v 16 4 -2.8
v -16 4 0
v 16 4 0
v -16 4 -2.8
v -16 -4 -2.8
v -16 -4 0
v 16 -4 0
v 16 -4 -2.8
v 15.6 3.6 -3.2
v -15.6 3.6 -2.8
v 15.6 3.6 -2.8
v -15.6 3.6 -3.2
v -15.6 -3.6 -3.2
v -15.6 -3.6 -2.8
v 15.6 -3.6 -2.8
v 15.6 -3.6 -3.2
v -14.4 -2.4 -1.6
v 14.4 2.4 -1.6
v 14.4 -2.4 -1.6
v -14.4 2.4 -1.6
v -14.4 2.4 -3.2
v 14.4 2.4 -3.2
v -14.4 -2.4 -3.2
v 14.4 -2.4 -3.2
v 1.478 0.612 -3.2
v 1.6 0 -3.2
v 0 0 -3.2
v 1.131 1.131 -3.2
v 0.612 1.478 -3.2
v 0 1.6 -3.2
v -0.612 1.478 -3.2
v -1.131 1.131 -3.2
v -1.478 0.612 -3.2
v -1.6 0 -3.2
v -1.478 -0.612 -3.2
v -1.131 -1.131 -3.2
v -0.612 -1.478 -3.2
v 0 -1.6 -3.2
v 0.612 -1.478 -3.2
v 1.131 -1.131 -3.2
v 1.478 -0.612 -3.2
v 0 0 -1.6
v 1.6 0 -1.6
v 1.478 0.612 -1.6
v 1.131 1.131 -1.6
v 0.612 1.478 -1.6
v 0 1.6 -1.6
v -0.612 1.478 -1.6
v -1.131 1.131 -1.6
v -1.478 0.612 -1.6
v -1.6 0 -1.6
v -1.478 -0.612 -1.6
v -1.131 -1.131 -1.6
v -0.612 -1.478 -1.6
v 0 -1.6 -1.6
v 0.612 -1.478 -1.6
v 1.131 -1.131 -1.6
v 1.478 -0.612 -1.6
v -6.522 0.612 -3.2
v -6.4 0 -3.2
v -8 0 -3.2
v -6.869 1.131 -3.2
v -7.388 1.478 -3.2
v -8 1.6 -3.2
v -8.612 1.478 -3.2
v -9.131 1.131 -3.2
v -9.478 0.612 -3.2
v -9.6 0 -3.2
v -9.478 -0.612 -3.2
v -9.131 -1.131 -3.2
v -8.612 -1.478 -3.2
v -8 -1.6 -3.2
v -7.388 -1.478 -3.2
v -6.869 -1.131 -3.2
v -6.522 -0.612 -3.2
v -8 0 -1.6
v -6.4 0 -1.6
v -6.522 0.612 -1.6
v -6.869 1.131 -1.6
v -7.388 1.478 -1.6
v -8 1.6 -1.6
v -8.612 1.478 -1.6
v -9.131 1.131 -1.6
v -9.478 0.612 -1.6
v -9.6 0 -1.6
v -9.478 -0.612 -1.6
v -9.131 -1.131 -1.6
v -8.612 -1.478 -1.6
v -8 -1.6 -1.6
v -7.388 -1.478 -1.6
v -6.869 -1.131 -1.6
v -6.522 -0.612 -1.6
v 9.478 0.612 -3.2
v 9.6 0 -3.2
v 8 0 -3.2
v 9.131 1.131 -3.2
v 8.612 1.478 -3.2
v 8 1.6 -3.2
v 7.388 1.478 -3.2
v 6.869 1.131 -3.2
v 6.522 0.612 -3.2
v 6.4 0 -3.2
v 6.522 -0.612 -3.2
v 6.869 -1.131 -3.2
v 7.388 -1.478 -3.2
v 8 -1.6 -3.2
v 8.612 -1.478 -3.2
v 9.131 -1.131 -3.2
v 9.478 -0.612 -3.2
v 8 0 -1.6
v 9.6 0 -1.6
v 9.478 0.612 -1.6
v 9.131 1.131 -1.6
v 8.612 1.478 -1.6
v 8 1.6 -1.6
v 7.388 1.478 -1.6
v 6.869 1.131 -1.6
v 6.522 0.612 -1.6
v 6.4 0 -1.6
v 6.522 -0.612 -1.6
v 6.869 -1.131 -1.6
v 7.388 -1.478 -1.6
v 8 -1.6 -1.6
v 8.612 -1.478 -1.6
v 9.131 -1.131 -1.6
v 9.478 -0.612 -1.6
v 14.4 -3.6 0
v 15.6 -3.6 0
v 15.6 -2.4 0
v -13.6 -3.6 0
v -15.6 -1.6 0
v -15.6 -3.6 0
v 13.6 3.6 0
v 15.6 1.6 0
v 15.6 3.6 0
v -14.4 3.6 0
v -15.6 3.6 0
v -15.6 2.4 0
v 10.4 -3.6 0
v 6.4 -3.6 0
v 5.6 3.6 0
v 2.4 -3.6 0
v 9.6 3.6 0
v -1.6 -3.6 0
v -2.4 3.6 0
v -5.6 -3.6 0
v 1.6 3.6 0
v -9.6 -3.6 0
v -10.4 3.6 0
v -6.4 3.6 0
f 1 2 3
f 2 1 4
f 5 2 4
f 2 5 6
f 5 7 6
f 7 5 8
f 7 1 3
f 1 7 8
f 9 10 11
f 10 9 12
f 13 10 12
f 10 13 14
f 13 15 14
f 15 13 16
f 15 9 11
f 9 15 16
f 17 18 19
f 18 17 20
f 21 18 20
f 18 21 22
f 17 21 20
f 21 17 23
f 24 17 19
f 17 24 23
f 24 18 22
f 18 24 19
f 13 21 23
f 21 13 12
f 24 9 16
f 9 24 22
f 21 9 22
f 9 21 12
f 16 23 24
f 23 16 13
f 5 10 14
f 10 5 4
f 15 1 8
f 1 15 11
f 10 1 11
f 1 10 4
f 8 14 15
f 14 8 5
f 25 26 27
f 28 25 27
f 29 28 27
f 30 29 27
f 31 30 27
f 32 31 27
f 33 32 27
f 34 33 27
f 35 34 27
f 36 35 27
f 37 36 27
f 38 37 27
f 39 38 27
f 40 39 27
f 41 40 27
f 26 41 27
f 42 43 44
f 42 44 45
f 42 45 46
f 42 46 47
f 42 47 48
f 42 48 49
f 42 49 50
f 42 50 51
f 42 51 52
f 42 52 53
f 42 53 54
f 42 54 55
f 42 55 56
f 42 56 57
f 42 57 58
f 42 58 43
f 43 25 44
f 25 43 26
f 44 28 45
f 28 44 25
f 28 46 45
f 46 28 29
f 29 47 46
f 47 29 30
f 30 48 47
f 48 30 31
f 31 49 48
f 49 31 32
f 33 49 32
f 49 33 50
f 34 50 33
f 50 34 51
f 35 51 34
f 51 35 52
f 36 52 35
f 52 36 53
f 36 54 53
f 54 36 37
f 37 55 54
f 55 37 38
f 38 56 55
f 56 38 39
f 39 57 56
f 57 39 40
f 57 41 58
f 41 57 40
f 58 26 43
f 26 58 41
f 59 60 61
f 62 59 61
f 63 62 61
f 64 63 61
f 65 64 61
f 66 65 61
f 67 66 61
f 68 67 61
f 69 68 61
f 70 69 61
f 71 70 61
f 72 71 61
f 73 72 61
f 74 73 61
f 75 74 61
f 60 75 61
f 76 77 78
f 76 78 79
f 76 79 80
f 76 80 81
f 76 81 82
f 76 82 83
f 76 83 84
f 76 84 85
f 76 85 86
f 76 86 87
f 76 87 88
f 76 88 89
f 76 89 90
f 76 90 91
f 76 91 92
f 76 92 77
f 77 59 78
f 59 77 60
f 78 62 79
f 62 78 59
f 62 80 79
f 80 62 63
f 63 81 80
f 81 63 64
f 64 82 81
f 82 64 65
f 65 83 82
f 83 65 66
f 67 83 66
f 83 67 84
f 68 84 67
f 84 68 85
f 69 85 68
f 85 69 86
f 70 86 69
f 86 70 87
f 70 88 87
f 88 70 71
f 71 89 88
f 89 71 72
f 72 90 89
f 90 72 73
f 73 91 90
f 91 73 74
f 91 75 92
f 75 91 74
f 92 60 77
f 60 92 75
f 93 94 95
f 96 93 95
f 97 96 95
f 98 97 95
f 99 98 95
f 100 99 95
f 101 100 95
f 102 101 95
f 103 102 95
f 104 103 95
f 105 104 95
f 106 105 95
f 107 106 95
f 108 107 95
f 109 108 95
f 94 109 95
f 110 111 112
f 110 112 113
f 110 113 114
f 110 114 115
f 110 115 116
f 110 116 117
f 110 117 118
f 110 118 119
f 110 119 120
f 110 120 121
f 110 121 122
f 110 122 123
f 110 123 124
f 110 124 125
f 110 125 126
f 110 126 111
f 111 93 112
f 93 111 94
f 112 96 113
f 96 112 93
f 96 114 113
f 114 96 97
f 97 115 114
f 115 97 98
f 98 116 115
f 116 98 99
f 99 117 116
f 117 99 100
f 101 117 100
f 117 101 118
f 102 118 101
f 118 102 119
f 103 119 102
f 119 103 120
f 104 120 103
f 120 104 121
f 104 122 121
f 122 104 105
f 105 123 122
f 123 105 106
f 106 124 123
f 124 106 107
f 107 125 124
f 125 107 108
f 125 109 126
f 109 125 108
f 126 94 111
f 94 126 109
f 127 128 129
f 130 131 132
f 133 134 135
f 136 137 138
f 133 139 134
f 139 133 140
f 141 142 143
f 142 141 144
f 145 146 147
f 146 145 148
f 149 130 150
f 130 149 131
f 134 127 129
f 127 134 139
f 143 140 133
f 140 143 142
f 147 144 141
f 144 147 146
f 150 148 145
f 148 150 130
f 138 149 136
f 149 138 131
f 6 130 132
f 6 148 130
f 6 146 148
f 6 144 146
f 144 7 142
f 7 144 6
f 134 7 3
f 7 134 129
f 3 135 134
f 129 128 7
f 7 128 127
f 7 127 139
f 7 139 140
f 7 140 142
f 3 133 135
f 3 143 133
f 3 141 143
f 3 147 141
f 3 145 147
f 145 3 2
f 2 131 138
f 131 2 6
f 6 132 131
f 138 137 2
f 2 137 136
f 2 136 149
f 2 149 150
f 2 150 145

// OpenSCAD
// file: ../p/4-4edge.scad
use <../lib.scad>
function ldraw_lib__4_4edge() = [
// 0 Circle 1.0
// 0 Name: 4-4edge.dat
// 0 Author: James Jessiman
// 0 !LDRAW_ORG Primitive UPDATE 2017-01
// 0 !LICENSE Licensed under CC BY 2.0 and CC BY 4.0 : see CAreadme.txt
// 
// 0 BFC CERTIFY CCW
  [0,"BFC","CERTIFY"],
  [0,"BFC","CCW"],
// 
// 0 !HISTORY 1998-12-15 [PTadmin] Official Update 1998-10
// 0 !HISTORY 2005-12-28 [PTadmin] Official Update 2005-01
// 0 !HISTORY 2007-06-24 [PTadmin] Header formatted for Contributor Agreement
// 0 !HISTORY 2008-07-01 [PTadmin] Official Update 2008-01
// 0 !HISTORY 2017-01-15 [Steffen] BFCed
// 0 !HISTORY 2017-12-30 [PTadmin] Official Update 2017-01
// 
// 
// 2 24 1 0 0 0.9239 0 0.3827
  [2,24,1,0,0,0.9239,0,0.3827],
// 2 24 0.9239 0 0.3827 0.7071 0 0.7071
  [2,24,0.9239,0,0.3827,0.7071,0,0.7071],
// 2 24 0.7071 0 0.7071 0.3827 0 0.9239
  [2,24,0.7071,0,0.7071,0.3827,0,0.9239],
// 2 24 0.3827 0 0.9239 0 0 1
  [2,24,0.3827,0,0.9239,0,0,1],
// 2 24 0 0 1 -0.3827 0 0.9239
  [2,24,0,0,1,-0.3827,0,0.9239],
// 2 24 -0.3827 0 0.9239 -0.7071 0 0.7071
  [2,24,-0.3827,0,0.9239,-0.7071,0,0.7071],
// 2 24 -0.7071 0 0.7071 -0.9239 0 0.3827
  [2,24,-0.7071,0,0.7071,-0.9239,0,0.3827],
// 2 24 -0.9239 0 0.3827 -1 0 -0
  [2,24,-0.9239,0,0.3827,-1,0,-0],
// 2 24 -1 0 -0 -0.9239 0 -0.3827
  [2,24,-1,0,-0,-0.9239,0,-0.3827],
// 2 24 -0.9239 0 -0.3827 -0.7071 0 -0.7071
  [2,24,-0.9239,0,-0.3827,-0.7071,0,-0.7071],
// 2 24 -0.7071 0 -0.7071 -0.3827 0 -0.9239
  [2,24,-0.7071,0,-0.7071,-0.3827,0,-0.9239],
// 2 24 -0.3827 0 -0.9239 0 0 -1
  [2,24,-0.3827,0,-0.9239,0,0,-1],
// 2 24 0 0 -1 0.3827 0 -0.9239
  [2,24,0,0,-1,0.3827,0,-0.9239],
// 2 24 0.3827 0 -0.9239 0.7071 0 -0.7071
  [2,24,0.3827,0,-0.9239,0.7071,0,-0.7071],
// 2 24 0.7071 0 -0.7071 0.9239 0 -0.3827
  [2,24,0.7071,0,-0.7071,0.9239,0,-0.3827],
// 2 24 0.9239 0 -0.3827 1 0 0
  [2,24,0.9239,0,-0.3827,1,0,0],
];
module ldraw_lib__4_4edge(step=0, col=false, unit=2/5, alt=false, line=0.2, solid=!$preview)
    makepoly(ldraw_lib__4_4edge(), step=step, col=col, unit=unit, alt=alt, line=line, solid=solid);
ldraw_lib__4_4edge(line=0.2);
// file: ../p/4-4disc.scad
use <../lib.scad>
function ldraw_lib__4_4disc() = [
// 0 Disc 1.0
// 0 Name: 4-4disc.dat
// 0 Author: James Jessiman
// 0 !LDRAW_ORG Primitive UPDATE 2002-02
// 0 !LICENSE Licensed under CC BY 2.0 and CC BY 4.0 : see CAreadme.txt
// 
// 0 BFC CERTIFY CCW
  [0,"BFC","CERTIFY"],
  [0,"BFC","CCW"],
// 
// 0 !HISTORY 1998-12-15 [PTadmin] Official Update 1998-10
// 0 !HISTORY 2002-03-23 [sbliss] Added BFC statement
// 0 !HISTORY 2002-04-25 [PTadmin] Official Update 2002-02
// 0 !HISTORY 2007-06-24 [PTadmin] Header formatted for Contributor Agreement
// 0 !HISTORY 2008-07-01 [PTadmin] Official Update 2008-01
// 
// 
// 3 16 0 0 0 1 0 0 0.9239 0 0.3827
  [3,16,0,0,0,1,0,0,0.9239,0,0.3827],
// 3 16 0 0 0 0.9239 0 0.3827 0.7071 0 0.7071
  [3,16,0,0,0,0.9239,0,0.3827,0.7071,0,0.7071],
// 3 16 0 0 0 0.7071 0 0.7071 0.3827 0 0.9239
  [3,16,0,0,0,0.7071,0,0.7071,0.3827,0,0.9239],
// 3 16 0 0 0 0.3827 0 0.9239 0 0 1
  [3,16,0,0,0,0.3827,0,0.9239,0,0,1],
// 3 16 0 0 0 0 0 1 -0.3827 0 0.9239
  [3,16,0,0,0,0,0,1,-0.3827,0,0.9239],
// 3 16 0 0 0 -0.3827 0 0.9239 -0.7071 0 0.7071
  [3,16,0,0,0,-0.3827,0,0.9239,-0.7071,0,0.7071],
// 3 16 0 0 0 -0.7071 0 0.7071 -0.9239 0 0.3827
  [3,16,0,0,0,-0.7071,0,0.7071,-0.9239,0,0.3827],
// 3 16 0 0 0 -0.9239 0 0.3827 -1 0 -0
  [3,16,0,0,0,-0.9239,0,0.3827,-1,0,-0],
// 3 16 0 0 0 -1 0 -0 -0.9239 0 -0.3827
  [3,16,0,0,0,-1,0,-0,-0.9239,0,-0.3827],
// 3 16 0 0 0 -0.9239 0 -0.3827 -0.7071 0 -0.7071
  [3,16,0,0,0,-0.9239,0,-0.3827,-0.7071,0,-0.7071],
// 3 16 0 0 0 -0.7071 0 -0.7071 -0.3827 0 -0.9239
  [3,16,0,0,0,-0.7071,0,-0.7071,-0.3827,0,-0.9239],
// 3 16 0 0 0 -0.3827 0 -0.9239 0 0 -1
  [3,16,0,0,0,-0.3827,0,-0.9239,0,0,-1],
// 3 16 0 0 0 0 0 -1 0.3827 0 -0.9239
  [3,16,0,0,0,0,0,-1,0.3827,0,-0.9239],
// 3 16 0 0 0 0.3827 0 -0.9239 0.7071 0 -0.7071
  [3,16,0,0,0,0.3827,0,-0.9239,0.7071,0,-0.7071],
// 3 16 0 0 0 0.7071 0 -0.7071 0.9239 0 -0.3827
  [3,16,0,0,0,0.7071,0,-0.7071,0.9239,0,-0.3827],
// 3 16 0 0 0 0.9239 0 -0.3827 1 0 0
  [3,16,0,0,0,0.9239,0,-0.3827,1,0,0],
// 0
];
module ldraw_lib__4_4disc(step=0, col=false, unit=2/5, alt=false, line=0.2, solid=!$preview)
    makepoly(ldraw_lib__4_4disc(), step=step, col=col, unit=unit, alt=alt, line=line, solid=solid);
ldraw_lib__4_4disc(line=0.2);
// file: ../p/4-4cyli.scad
use <../lib.scad>
$fa=1; $fs=0.2;
function ldraw_lib__4_4cyli(realsolid=false) = [
// 0 Cylinder 1.0
// 0 Name: 4-4cyli.dat
// 0 Author: James Jessiman
// 0 !LDRAW_ORG Primitive UPDATE 2005-01
// 0 !LICENSE Licensed under CC BY 2.0 and CC BY 4.0 : see CAreadme.txt
// 
// 0 BFC CERTIFY CCW
  [0,"BFC","CERTIFY"],
  [0,"BFC","CCW"],
// 
// 0 !HISTORY 1998-12-15 [PTadmin] Official Update 1998-10
// 0 !HISTORY 2002-03-23 [sbliss] Added BFC statement; merged headers from files in distributions LDraw 0.27 and Complete.
// 0 !HISTORY 2002-04-25 [PTadmin] Official Update 2002-02
// 0 !HISTORY 2004-12-14 [guyvivan] BFC CCW
// 0 !HISTORY 2005-12-28 [PTadmin] Official Update 2005-01
// 0 !HISTORY 2007-06-24 [PTadmin] Header formatted for Contributor Agreement
// 0 !HISTORY 2008-07-01 [PTadmin] Official Update 2008-01
// 
// 
// 4 16 1 1 0 0.9239 1 0.3827 0.9239 0 0.3827 1 0 0
  [4,16,1,1,0,0.9239,1,0.3827,0.9239,0,0.3827,1,0,0],
// 5 24 1 0 0 1 1 0 0.9239 0 0.3827 0.9239 0 -0.3827
  [5,24,1,0,0,1,1,0,0.9239,0,0.3827,0.9239,0,-0.3827],
// 4 16 0.9239 1 0.3827 0.7071 1 0.7071 0.7071 0 0.7071 0.9239 0 0.3827
  [4,16,0.9239,1,0.3827,0.7071,1,0.7071,0.7071,0,0.7071,0.9239,0,0.3827],
// 5 24 0.9239 0 0.3827 0.9239 1 0.3827 0.7071 0 0.7071 1 0 0
  [5,24,0.9239,0,0.3827,0.9239,1,0.3827,0.7071,0,0.7071,1,0,0],
// 4 16 0.7071 1 0.7071 0.3827 1 0.9239 0.3827 0 0.9239 0.7071 0 0.7071
  [4,16,0.7071,1,0.7071,0.3827,1,0.9239,0.3827,0,0.9239,0.7071,0,0.7071],
// 5 24 0.7071 0 0.7071 0.7071 1 0.7071 0.3827 0 0.9239 0.9239 0 0.3827
  [5,24,0.7071,0,0.7071,0.7071,1,0.7071,0.3827,0,0.9239,0.9239,0,0.3827],
// 4 16 0.3827 1 0.9239 0 1 1 0 0 1 0.3827 0 0.9239
  [4,16,0.3827,1,0.9239,0,1,1,0,0,1,0.3827,0,0.9239],
// 5 24 0.3827 0 0.9239 0.3827 1 0.9239 0 0 1 0.7071 0 0.7071
  [5,24,0.3827,0,0.9239,0.3827,1,0.9239,0,0,1,0.7071,0,0.7071],
// 4 16 0 1 1 -0.3827 1 0.9239 -0.3827 0 0.9239 0 0 1
  [4,16,0,1,1,-0.3827,1,0.9239,-0.3827,0,0.9239,0,0,1],
// 5 24 0 0 1 0 1 1 -0.3827 0 0.9239 0.3827 0 0.9239
  [5,24,0,0,1,0,1,1,-0.3827,0,0.9239,0.3827,0,0.9239],
// 4 16 -0.3827 1 0.9239 -0.7071 1 0.7071 -0.7071 0 0.7071 -0.3827 0 0.9239
  [4,16,-0.3827,1,0.9239,-0.7071,1,0.7071,-0.7071,0,0.7071,-0.3827,0,0.9239],
// 5 24 -0.3827 0 0.9239 -0.3827 1 0.9239 -0.7071 0 0.7071 0 0 1
  [5,24,-0.3827,0,0.9239,-0.3827,1,0.9239,-0.7071,0,0.7071,0,0,1],
// 4 16 -0.7071 1 0.7071 -0.9239 1 0.3827 -0.9239 0 0.3827 -0.7071 0 0.7071
  [4,16,-0.7071,1,0.7071,-0.9239,1,0.3827,-0.9239,0,0.3827,-0.7071,0,0.7071],
// 5 24 -0.7071 0 0.7071 -0.7071 1 0.7071 -0.9239 0 0.3827 -0.3827 0 0.9239
  [5,24,-0.7071,0,0.7071,-0.7071,1,0.7071,-0.9239,0,0.3827,-0.3827,0,0.9239],
// 4 16 -0.9239 1 0.3827 -1 1 0 -1 0 0 -0.9239 0 0.3827
  [4,16,-0.9239,1,0.3827,-1,1,0,-1,0,0,-0.9239,0,0.3827],
// 5 24 -0.9239 0 0.3827 -0.9239 1 0.3827 -1 0 0 -0.7071 0 0.7071
  [5,24,-0.9239,0,0.3827,-0.9239,1,0.3827,-1,0,0,-0.7071,0,0.7071],
// 4 16 -1 1 0 -0.9239 1 -0.3827 -0.9239 0 -0.3827 -1 0 0
  [4,16,-1,1,0,-0.9239,1,-0.3827,-0.9239,0,-0.3827,-1,0,0],
// 5 24 -1 0 0 -1 1 0 -0.9239 0 -0.3827 -0.9239 0 0.3827
  [5,24,-1,0,0,-1,1,0,-0.9239,0,-0.3827,-0.9239,0,0.3827],
// 4 16 -0.9239 1 -0.3827 -0.7071 1 -0.7071 -0.7071 0 -0.7071 -0.9239 0 -0.3827
  [4,16,-0.9239,1,-0.3827,-0.7071,1,-0.7071,-0.7071,0,-0.7071,-0.9239,0,-0.3827],
// 5 24 -0.9239 0 -0.3827 -0.9239 1 -0.3827 -0.7071 0 -0.7071 -1 0 0
  [5,24,-0.9239,0,-0.3827,-0.9239,1,-0.3827,-0.7071,0,-0.7071,-1,0,0],
// 4 16 -0.7071 1 -0.7071 -0.3827 1 -0.9239 -0.3827 0 -0.9239 -0.7071 0 -0.7071
  [4,16,-0.7071,1,-0.7071,-0.3827,1,-0.9239,-0.3827,0,-0.9239,-0.7071,0,-0.7071],
// 5 24 -0.7071 0 -0.7071 -0.7071 1 -0.7071 -0.3827 0 -0.9239 -0.9239 0 -0.3827
  [5,24,-0.7071,0,-0.7071,-0.7071,1,-0.7071,-0.3827,0,-0.9239,-0.9239,0,-0.3827],
// 4 16 -0.3827 1 -0.9239 0 1 -1 0 0 -1 -0.3827 0 -0.9239
  [4,16,-0.3827,1,-0.9239,0,1,-1,0,0,-1,-0.3827,0,-0.9239],
// 5 24 -0.3827 0 -0.9239 -0.3827 1 -0.9239 0 0 -1 -0.7071 0 -0.7071
  [5,24,-0.3827,0,-0.9239,-0.3827,1,-0.9239,0,0,-1,-0.7071,0,-0.7071],
// 4 16 0 1 -1 0.3827 1 -0.9239 0.3827 0 -0.9239 0 0 -1
  [4,16,0,1,-1,0.3827,1,-0.9239,0.3827,0,-0.9239,0,0,-1],
// 5 24 0 0 -1 0 1 -1 0.3827 0 -0.9239 -0.3827 0 -0.9239
  [5,24,0,0,-1,0,1,-1,0.3827,0,-0.9239,-0.3827,0,-0.9239],
// 4 16 0.3827 1 -0.9239 0.7071 1 -0.7071 0.7071 0 -0.7071 0.3827 0 -0.9239
  [4,16,0.3827,1,-0.9239,0.7071,1,-0.7071,0.7071,0,-0.7071,0.3827,0,-0.9239],
// 5 24 0.3827 0 -0.9239 0.3827 1 -0.9239 0.7071 0 -0.7071 0 0 -1
  [5,24,0.3827,0,-0.9239,0.3827,1,-0.9239,0.7071,0,-0.7071,0,0,-1],
// 4 16 0.7071 1 -0.7071 0.9239 1 -0.3827 0.9239 0 -0.3827 0.7071 0 -0.7071
  [4,16,0.7071,1,-0.7071,0.9239,1,-0.3827,0.9239,0,-0.3827,0.7071,0,-0.7071],
// 5 24 0.7071 0 -0.7071 0.7071 1 -0.7071 0.9239 0 -0.3827 0.3827 0 -0.9239
  [5,24,0.7071,0,-0.7071,0.7071,1,-0.7071,0.9239,0,-0.3827,0.3827,0,-0.9239],
// 4 16 0.9239 1 -0.3827 1 1 0 1 0 0 0.9239 0 -0.3827
  [4,16,0.9239,1,-0.3827,1,1,0,1,0,0,0.9239,0,-0.3827],
// 5 24 0.9239 0 -0.3827 0.9239 1 -0.3827 1 0 0 0.7071 0 -0.7071
  [5,24,0.9239,0,-0.3827,0.9239,1,-0.3827,1,0,0,0.7071,0,-0.7071],
// 0
];
module ldraw_lib__4_4cyli(step=0, col=false, unit=2/5, alt=false, line=0.2, solid=!$preview)
    makepoly(ldraw_lib__4_4cyli(solid), step=step, col=col, unit=unit, alt=alt, line=line, solid=solid);
ldraw_lib__4_4cyli(line=0.2);
// file: ../p/stud3.scad
use <../lib.scad>
use <4-4cyli.scad>
use <4-4disc.scad>
use <4-4edge.scad>
function ldraw_lib__stud3() = [
// 0 Stud Tube Solid
// 0 Name: stud3.dat
// 0 Author: James Jessiman
// 0 !LDRAW_ORG Primitive UPDATE 2012-01
// 0 !LICENSE Licensed under CC BY 4.0 : see CAreadme.txt
// 
// 0 BFC CERTIFY CCW
  [0,"BFC","CERTIFY"],
  [0,"BFC","CCW"],
// 
// 0 !HISTORY 2002-04-04 [sbliss] Modified for BFC compliance
// 0 !HISTORY 2002-04-25 [PTadmin] Official Update 2002-02
// 0 !HISTORY 2007-06-24 [PTadmin] Header formatted for Contributor Agreement
// 0 !HISTORY 2008-07-01 [PTadmin] Official Update 2008-01
// 0 !HISTORY 2012-02-16 [Philo] Changed to CCW
// 0 !HISTORY 2012-03-30 [PTadmin] Official Update 2012-01
// 
// 
// 1 16 0 -4 0 4 0 0 0 1 0 0 0 4 4-4edge.dat
  [1,16,0,-4,0,4,0,0,0,1,0,0,0,4, ldraw_lib__4_4edge()],
// 1 16 0 0 0 4 0 0 0 1 0 0 0 4 4-4edge.dat
  [1,16,0,0,0,4,0,0,0,1,0,0,0,4, ldraw_lib__4_4edge()],
// 1 16 0 -4 0 4 0 0 0 1 0 0 0 4 4-4disc.dat
  [1,16,0,-4,0,4,0,0,0,1,0,0,0,4, ldraw_lib__4_4disc()],
  [-1,16,0,0,0,4,0,0,0,-1,0,0,0,4, ldraw_lib__4_4disc()],
// 1 16 0 -4 0 4 0 0 0 4 0 0 0 4 4-4cyli.dat
  [1,16,0,-4,0,4,0,0,0,4,0,0,0,4, ldraw_lib__4_4cyli()],
];
module ldraw_lib__stud3(step=0, col=false, unit=2/5, alt=false, line=0.2, solid=!$preview)
    makepoly(ldraw_lib__stud3(), step=step, col=col, unit=unit, alt=alt, line=line, solid=solid);
ldraw_lib__stud3(line=0.2);
// file: ../p/box5.scad
use <../lib.scad>
function ldraw_lib__box5() = [
// 0 Box with 5 Faces and All Edges
// 0 Name: box5.dat
// 0 Author: James Jessiman
// 0 !LDRAW_ORG Primitive UPDATE 2012-01
// 0 !LICENSE Licensed under CC BY 2.0 and CC BY 4.0 : see CAreadme.txt
// 
// 0 BFC CERTIFY CCW
  [0,"BFC","CERTIFY"],
  [0,"BFC","CCW"],
// 
// 0 !HISTORY 2002-04-03 [sbliss] Modified for BFC compliance
// 0 !HISTORY 2002-04-25 [PTadmin] Official Update 2002-02
// 0 !HISTORY 2007-06-24 [PTadmin] Header formatted for Contributor Agreement
// 0 !HISTORY 2008-07-01 [PTadmin] Official Update 2008-01
// 0 !HISTORY 2012-02-16 [Philo] Changed to CCW
// 0 !HISTORY 2012-03-30 [PTadmin] Official Update 2012-01
// 
// 
// 2 24 1 1 1 -1 1 1
  [2,24,1,1,1,-1,1,1],
// 2 24 -1 1 1 -1 1 -1
  [2,24,-1,1,1,-1,1,-1],
// 2 24 -1 1 -1 1 1 -1
  [2,24,-1,1,-1,1,1,-1],
// 2 24 1 1 -1 1 1 1
  [2,24,1,1,-1,1,1,1],
// 2 24 1 0 1 -1 0 1
  [2,24,1,0,1,-1,0,1],
// 2 24 -1 0 1 -1 0 -1
  [2,24,-1,0,1,-1,0,-1],
// 2 24 -1 0 -1 1 0 -1
  [2,24,-1,0,-1,1,0,-1],
// 2 24 1 0 -1 1 0 1
  [2,24,1,0,-1,1,0,1],
// 2 24 1 0 1 1 1 1
  [2,24,1,0,1,1,1,1],
// 2 24 -1 0 1 -1 1 1
  [2,24,-1,0,1,-1,1,1],
// 2 24 1 0 -1 1 1 -1
  [2,24,1,0,-1,1,1,-1],
// 2 24 -1 0 -1 -1 1 -1
  [2,24,-1,0,-1,-1,1,-1],
// 4 16 -1 1 1 1 1 1 1 1 -1 -1 1 -1
  [4,16,-1,1,1,1,1,1,1,1,-1,-1,1,-1],
// 4 16 -1 1 1 -1 0 1 1 0 1 1 1 1
  [4,16,-1,1,1,-1,0,1,1,0,1,1,1,1],
// 4 16 -1 1 -1 -1 0 -1 -1 0 1 -1 1 1
  [4,16,-1,1,-1,-1,0,-1,-1,0,1,-1,1,1],
// 4 16 1 1 -1 1 0 -1 -1 0 -1 -1 1 -1
  [4,16,1,1,-1,1,0,-1,-1,0,-1,-1,1,-1],
// 4 16 1 1 1 1 0 1 1 0 -1 1 1 -1
  [4,16,1,1,1,1,0,1,1,0,-1,1,1,-1],
];
makepoly(ldraw_lib__box5(), line=0.2);
// file: ../p/box4.scad
use <../lib.scad>
function ldraw_lib__box4() = [
// 0 Box with 4 Faces (2 Parallel Pairs) and All Edges
// 0 Name: box4.dat
// 0 Author: James Jessiman
// 0 !LDRAW_ORG Primitive UPDATE 2012-01
// 0 !LICENSE Licensed under CC BY 4.0 : see CAreadme.txt
// 
// 0 BFC CERTIFY CCW
  [0,"BFC","CERTIFY"],
  [0,"BFC","CCW"],
// 
// 0 !HISTORY 2002-04-03 [sbliss] Modified for BFC compliance
// 0 !HISTORY 2002-04-25 [PTadmin] Official Update 2002-02
// 0 !HISTORY 2007-06-24 [PTadmin] Header formatted for Contributor Agreement
// 0 !HISTORY 2008-07-01 [PTadmin] Official Update 2008-01
// 0 !HISTORY 2012-02-16 [Philo] Changed to CCW
// 0 !HISTORY 2012-03-30 [PTadmin] Official Update 2012-01
// 
// 
// 2 24 1 1 1 -1 1 1
  [2,24,1,1,1,-1,1,1],
// 2 24 -1 1 1 -1 1 -1
  [2,24,-1,1,1,-1,1,-1],
// 2 24 -1 1 -1 1 1 -1
  [2,24,-1,1,-1,1,1,-1],
// 2 24 1 1 -1 1 1 1
  [2,24,1,1,-1,1,1,1],
// 2 24 1 0 1 -1 0 1
  [2,24,1,0,1,-1,0,1],
// 2 24 -1 0 1 -1 0 -1
  [2,24,-1,0,1,-1,0,-1],
// 2 24 -1 0 -1 1 0 -1
  [2,24,-1,0,-1,1,0,-1],
// 2 24 1 0 -1 1 0 1
  [2,24,1,0,-1,1,0,1],
// 2 24 1 0 1 1 1 1
  [2,24,1,0,1,1,1,1],
// 2 24 -1 0 1 -1 1 1
  [2,24,-1,0,1,-1,1,1],
// 2 24 1 0 -1 1 1 -1
  [2,24,1,0,-1,1,1,-1],
// 2 24 -1 0 -1 -1 1 -1
  [2,24,-1,0,-1,-1,1,-1],
// 4 16 -1 1 1 -1 0 1 1 0 1 1 1 1
  [4,16,-1,1,1,-1,0,1,1,0,1,1,1,1],
// 4 16 -1 1 -1 -1 0 -1 -1 0 1 -1 1 1
  [4,16,-1,1,-1,-1,0,-1,-1,0,1,-1,1,1],
// 4 16 1 1 -1 1 0 -1 -1 0 -1 -1 1 -1
  [4,16,1,1,-1,1,0,-1,-1,0,-1,-1,1,-1],
// 4 16 1 1 1 1 0 1 1 0 -1 1 1 -1
  [4,16,1,1,1,1,0,1,1,0,-1,1,1,-1],
];
module ldraw_lib__box4(step=0, col=false, unit=2/5, alt=false, line=0.2, solid=!$preview)
    makepoly(ldraw_lib__box4(), step=step, col=col, unit=unit, alt=alt, line=line, solid=solid);
ldraw_lib__box4(line=0.2);
// file: s/2431s01.scad
use <../../lib.scad>
use <../../p/box4.scad>
use <../../p/box5.scad>
use <../../p/stud3.scad>
function ldraw_lib__s__2431s01() = [
// 0 ~Tile  1 x  4 with Groove without Top Face
// 0 Name: s\2431s01.dat
// 0 Author: Santeri Piippo [arezey]
// 0 !LDRAW_ORG Subpart UPDATE 2010-02
// 0 !LICENSE Licensed under CC BY 2.0 and CC BY 4.0 : see CAreadme.txt
// 
// 0 BFC CERTIFY CCW
  [0,"BFC","CERTIFY"],
  [0,"BFC","CCW"],
// 
// 0 !HISTORY 2010-07-05 [PTadmin] Official Update 2010-02
// 
// 
// 1 16 0 0 0 40 0 0 0 7 0 0 0 10 box4.dat
  [1,16,0,0,0,40,0,0,0,7,0,0,0,10, ldraw_lib__box4()],
// 1 16 0 7 0 39 0 0 0 1 0 0 0 9 box4.dat
  [1,16,0,7,0,39,0,0,0,1,0,0,0,9, ldraw_lib__box4()],
// 0 BFC INVERTNEXT
  [0,"BFC","INVERTNEXT"],
// 1 16 0 8 0 36 0 0 0 -4 0 0 0 6 box5.dat
  [1,16,0,8,0,36,0,0,0,-4,0,0,0,6, ldraw_lib__box5()],
// 4 16 -39 8 9 -36 8 6 -36 8 -6 -39 8 -9
  [4,16,-39,8,9,-36,8,6,-36,8,-6,-39,8,-9],
// 4 16 39 8 -9 36 8 -6 36 8 6 39 8 9
  [4,16,39,8,-9,36,8,-6,36,8,6,39,8,9],
// 4 16 39 8 9 36 8 6 -36 8 6 -39 8 9
  [4,16,39,8,9,36,8,6,-36,8,6,-39,8,9],
// 4 16 -39 8 -9 -36 8 -6 36 8 -6 39 8 -9
  [4,16,-39,8,-9,-36,8,-6,36,8,-6,39,8,-9],
// 4 16 -40 7 10 -39 7 9 -39 7 -9 -40 7 -10
  [4,16,-40,7,10,-39,7,9,-39,7,-9,-40,7,-10],
// 4 16 40 7 -10 39 7 -9 39 7 9 40 7 10
  [4,16,40,7,-10,39,7,-9,39,7,9,40,7,10],
// 4 16 40 7 10 39 7 9 -39 7 9 -40 7 10
  [4,16,40,7,10,39,7,9,-39,7,9,-40,7,10],
// 4 16 -40 7 -10 -39 7 -9 39 7 -9 40 7 -10
  [4,16,-40,7,-10,-39,7,-9,39,7,-9,40,7,-10],
// 1 16 0 4 0 1 0 0 0 -1 0 0 0 1 stud3.dat
  [1,16,0,4,0,1,0,0,0,-1,0,0,0,1, ldraw_lib__stud3()],
// 1 16 -20 4 0 1 0 0 0 -1 0 0 0 1 stud3.dat
  [1,16,-20,4,0,1,0,0,0,-1,0,0,0,1, ldraw_lib__stud3()],
// 1 16 20 4 0 1 0 0 0 -1 0 0 0 1 stud3.dat
  [1,16,20,4,0,1,0,0,0,-1,0,0,0,1, ldraw_lib__stud3()],
// 0 //
];
makepoly(ldraw_lib__s__2431s01(), line=0.2);
// file: s/2431p02s03.scad
use <../../lib.scad>
function ldraw_lib__s__2431p02s03() = [
// 0 ~Tile  1 x  4 with Red Danger Stripes Pattern - Half Border
// 0 Name: s\2431p02s03.dat
// 0 Author: Marc Giraudet [Mad_Marc]
// 0 !LDRAW_ORG Subpart UPDATE 2024-06
// 0 !LICENSE Licensed under CC BY 4.0 : see CAreadme.txt
// 
// 0 BFC CERTIFY CCW
  [0,"BFC","CERTIFY"],
  [0,"BFC","CCW"],
// 
// 0 !HISTORY 2024-07-29 [OrionP] Official Update 2024-06
// 
// 3 16 -40 0 -10 -34 0 -9 -39 0 -9
  [3,16,-40,0,-10,-34,0,-9,-39,0,-9],
// 3 16 -40 0 -10 -24 0 -9 -34 0 -9
  [3,16,-40,0,-10,-24,0,-9,-34,0,-9],
// 3 16 -40 0 -10 -14 0 -9 -24 0 -9
  [3,16,-40,0,-10,-14,0,-9,-24,0,-9],
// 3 16 -40 0 -10 -4 0 -9 -14 0 -9
  [3,16,-40,0,-10,-4,0,-9,-14,0,-9],
// 4 16 -40 0 -10 40 0 -10 6 0 -9 -4 0 -9
  [4,16,-40,0,-10,40,0,-10,6,0,-9,-4,0,-9],
// 4 16 40 0 10 39 0 4 39 0 -6 40 0 -10
  [4,16,40,0,10,39,0,4,39,0,-6,40,0,-10],
// 3 16 40 0 10 39 0 9 39 0 4
  [3,16,40,0,10,39,0,9,39,0,4],
// 3 16 39 0 -6 39 0 -9 40 0 -10
  [3,16,39,0,-6,39,0,-9,40,0,-10],
// 3 16 40 0 -10 39 0 -9 36 0 -9
  [3,16,40,0,-10,39,0,-9,36,0,-9],
// 3 16 40 0 -10 36 0 -9 26 0 -9
  [3,16,40,0,-10,36,0,-9,26,0,-9],
// 3 16 40 0 -10 26 0 -9 16 0 -9
  [3,16,40,0,-10,26,0,-9,16,0,-9],
// 3 16 40 0 -10 16 0 -9 6 0 -9
  [3,16,40,0,-10,16,0,-9,6,0,-9],
];
module ldraw_lib__s__2431p02s03(step=0, col=false, unit=2/5, alt=false, line=0.2, solid=!$preview)
    makepoly(ldraw_lib__s__2431p02s03(), step=step, col=col, unit=unit, alt=alt, line=line, solid=solid);
ldraw_lib__s__2431p02s03(line=0.2);
// file: s/2431p02s02.scad
use <../../lib.scad>
function ldraw_lib__s__2431p02s02() = [
// 0 ~Tile  1 x  4 with Danger Stripes Red Pattern - Zag
// 0 Name: s\2431p02s02.dat
// 0 Author: Marc Giraudet [Mad_Marc]
// 0 !LDRAW_ORG Subpart UPDATE 2024-06
// 0 !LICENSE Licensed under CC BY 4.0 : see CAreadme.txt
// 
// 0 BFC CERTIFY CCW
  [0,"BFC","CERTIFY"],
  [0,"BFC","CCW"],
// 
// 0 !HISTORY 2024-07-29 [OrionP] Official Update 2024-06
// 
// 4 16 39 0 4 26 0 -9 36 0 -9 39 0 -6
  [4,16,39,0,4,26,0,-9,36,0,-9,39,0,-6],
// 4 16 24 0 9 6 0 -9 16 0 -9 34 0 9
  [4,16,24,0,9,6,0,-9,16,0,-9,34,0,9],
// 4 16 4 0 9 -14 0 -9 -4 0 -9 14 0 9
  [4,16,4,0,9,-14,0,-9,-4,0,-9,14,0,9],
// 4 16 -16 0 9 -34 0 -9 -24 0 -9 -6 0 9
  [4,16,-16,0,9,-34,0,-9,-24,0,-9,-6,0,9],
// 4 16 -36 0 9 -39 0 6 -39 0 -4 -26 0 9
  [4,16,-36,0,9,-39,0,6,-39,0,-4,-26,0,9],
];
module ldraw_lib__s__2431p02s02(step=0, col=false, unit=2/5, alt=false, line=0.2, solid=!$preview)
    makepoly(ldraw_lib__s__2431p02s02(), step=step, col=col, unit=unit, alt=alt, line=line, solid=solid);
ldraw_lib__s__2431p02s02(line=0.2);
// file: s/2431p02s01.scad
use <../../lib.scad>
function ldraw_lib__s__2431p02s01() = [
// 0 ~Tile  1 x  4 with Danger Stripes Red Pattern - Zig
// 0 Name: s\2431p02s01.dat
// 0 Author: Marc Giraudet [Mad_Marc]
// 0 !LDRAW_ORG Subpart UPDATE 2024-06
// 0 !LICENSE Licensed under CC BY 4.0 : see CAreadme.txt
// 
// 0 BFC CERTIFY CCW
  [0,"BFC","CERTIFY"],
  [0,"BFC","CCW"],
// 
// 0 !HISTORY 2024-07-29 [OrionP] Official Update 2024-06
// 
// 3 16 36 0 -9 39 0 -9 39 0 -6
  [3,16,36,0,-9,39,0,-9,39,0,-6],
// 3 16 -34 0 -9 -39 0 -4 -39 0 -9
  [3,16,-34,0,-9,-39,0,-4,-39,0,-9],
// 3 16 34 0 9 39 0 4 39 0 9
  [3,16,34,0,9,39,0,4,39,0,9],
// 3 16 -36 0 9 -39 0 9 -39 0 6
  [3,16,-36,0,9,-39,0,9,-39,0,6],
// 4 16 34 0 9 16 0 -9 26 0 -9 39 0 4
  [4,16,34,0,9,16,0,-9,26,0,-9,39,0,4],
// 4 16 14 0 9 -4 0 -9 6 0 -9 24 0 9
  [4,16,14,0,9,-4,0,-9,6,0,-9,24,0,9],
// 4 16 -6 0 9 -24 0 -9 -14 0 -9 4 0 9
  [4,16,-6,0,9,-24,0,-9,-14,0,-9,4,0,9],
// 4 16 -39 0 -4 -34 0 -9 -16 0 9 -26 0 9
  [4,16,-39,0,-4,-34,0,-9,-16,0,9,-26,0,9],
];
module ldraw_lib__s__2431p02s01(step=0, col=false, unit=2/5, alt=false, line=0.2, solid=!$preview)
    makepoly(ldraw_lib__s__2431p02s01(), step=step, col=col, unit=unit, alt=alt, line=line, solid=solid);
ldraw_lib__s__2431p02s01(line=0.2);
// main file
use <../lib.scad>
use <s/2431p02s01.scad>
use <s/2431p02s02.scad>
use <s/2431p02s03.scad>
use <s/2431s01.scad>
function ldraw_lib__2431p02() = [
// 0 Tile  1 x  4 with Red Danger Stripes Pattern
// 0 Name: 2431p02.dat
// 0 Author: James Jessiman
// 0 !LDRAW_ORG Part UPDATE 2024-06
// 0 !LICENSE Licensed under CC BY 4.0 : see CAreadme.txt
// 
// 0 BFC CERTIFY CCW
  [0,"BFC","CERTIFY"],
  [0,"BFC","CCW"],
// 
// 0 !KEYWORDS Rebrickable 2431pr0077, set 6395
// 
// 0 !HISTORY 1999-12-31 [PTadmin] Official Update 1999-06
// 0 !HISTORY 2003-03-12 [PTadmin] Official Update 2003-01
// 0 !HISTORY 2007-05-12 [PTadmin] Header formatted for Contributor Agreement
// 0 !HISTORY 2008-07-01 [PTadmin] Official Update 2008-01
// 0 !HISTORY 2009-09-03 [anathema] Removed edge-lines from pattern
// 0 !HISTORY 2009-12-29 [PTadmin] Official Update 2009-03
// 0 !HISTORY 2024-07-08 [Mad_Marc] Subfiles Added
// 0 !HISTORY 2024-07-29 [OrionP] Official Update 2024-06
// 
// 1 16 0 0 0 1 0 0 0 1 0 0 0 1 s\2431s01.dat
  [1,16,0,0,0,1,0,0,0,1,0,0,0,1, ldraw_lib__s__2431s01()],
// 1 4 0 0 0 1 0 0 0 1 0 0 0 1 s\2431p02s01.dat
  [1,4,0,0,0,1,0,0,0,1,0,0,0,1, ldraw_lib__s__2431p02s01()],
// 1 16 0 0 0 1 0 0 0 1 0 0 0 1 s\2431p02s02.dat
  [1,16,0,0,0,1,0,0,0,1,0,0,0,1, ldraw_lib__s__2431p02s02()],
// 1 16 0 0 0 1 0 0 0 1 0 0 0 1 s\2431p02s03.dat
  [1,16,0,0,0,1,0,0,0,1,0,0,0,1, ldraw_lib__s__2431p02s03()],
// 1 16 0 0 0 -1 0 0 0 1 0 0 0 -1 s\2431p02s03.dat
  [1,16,0,0,0,-1,0,0,0,1,0,0,0,-1, ldraw_lib__s__2431p02s03()],
];
module ldraw_lib__2431p02(step=0, col=false, unit=2/5, alt=false, line=0.2, solid=!$preview)
    makepoly(ldraw_lib__2431p02(), step=step, col=col, unit=unit, alt=alt, line=line, solid=solid);
ldraw_lib__2431p02(line=0.2);
